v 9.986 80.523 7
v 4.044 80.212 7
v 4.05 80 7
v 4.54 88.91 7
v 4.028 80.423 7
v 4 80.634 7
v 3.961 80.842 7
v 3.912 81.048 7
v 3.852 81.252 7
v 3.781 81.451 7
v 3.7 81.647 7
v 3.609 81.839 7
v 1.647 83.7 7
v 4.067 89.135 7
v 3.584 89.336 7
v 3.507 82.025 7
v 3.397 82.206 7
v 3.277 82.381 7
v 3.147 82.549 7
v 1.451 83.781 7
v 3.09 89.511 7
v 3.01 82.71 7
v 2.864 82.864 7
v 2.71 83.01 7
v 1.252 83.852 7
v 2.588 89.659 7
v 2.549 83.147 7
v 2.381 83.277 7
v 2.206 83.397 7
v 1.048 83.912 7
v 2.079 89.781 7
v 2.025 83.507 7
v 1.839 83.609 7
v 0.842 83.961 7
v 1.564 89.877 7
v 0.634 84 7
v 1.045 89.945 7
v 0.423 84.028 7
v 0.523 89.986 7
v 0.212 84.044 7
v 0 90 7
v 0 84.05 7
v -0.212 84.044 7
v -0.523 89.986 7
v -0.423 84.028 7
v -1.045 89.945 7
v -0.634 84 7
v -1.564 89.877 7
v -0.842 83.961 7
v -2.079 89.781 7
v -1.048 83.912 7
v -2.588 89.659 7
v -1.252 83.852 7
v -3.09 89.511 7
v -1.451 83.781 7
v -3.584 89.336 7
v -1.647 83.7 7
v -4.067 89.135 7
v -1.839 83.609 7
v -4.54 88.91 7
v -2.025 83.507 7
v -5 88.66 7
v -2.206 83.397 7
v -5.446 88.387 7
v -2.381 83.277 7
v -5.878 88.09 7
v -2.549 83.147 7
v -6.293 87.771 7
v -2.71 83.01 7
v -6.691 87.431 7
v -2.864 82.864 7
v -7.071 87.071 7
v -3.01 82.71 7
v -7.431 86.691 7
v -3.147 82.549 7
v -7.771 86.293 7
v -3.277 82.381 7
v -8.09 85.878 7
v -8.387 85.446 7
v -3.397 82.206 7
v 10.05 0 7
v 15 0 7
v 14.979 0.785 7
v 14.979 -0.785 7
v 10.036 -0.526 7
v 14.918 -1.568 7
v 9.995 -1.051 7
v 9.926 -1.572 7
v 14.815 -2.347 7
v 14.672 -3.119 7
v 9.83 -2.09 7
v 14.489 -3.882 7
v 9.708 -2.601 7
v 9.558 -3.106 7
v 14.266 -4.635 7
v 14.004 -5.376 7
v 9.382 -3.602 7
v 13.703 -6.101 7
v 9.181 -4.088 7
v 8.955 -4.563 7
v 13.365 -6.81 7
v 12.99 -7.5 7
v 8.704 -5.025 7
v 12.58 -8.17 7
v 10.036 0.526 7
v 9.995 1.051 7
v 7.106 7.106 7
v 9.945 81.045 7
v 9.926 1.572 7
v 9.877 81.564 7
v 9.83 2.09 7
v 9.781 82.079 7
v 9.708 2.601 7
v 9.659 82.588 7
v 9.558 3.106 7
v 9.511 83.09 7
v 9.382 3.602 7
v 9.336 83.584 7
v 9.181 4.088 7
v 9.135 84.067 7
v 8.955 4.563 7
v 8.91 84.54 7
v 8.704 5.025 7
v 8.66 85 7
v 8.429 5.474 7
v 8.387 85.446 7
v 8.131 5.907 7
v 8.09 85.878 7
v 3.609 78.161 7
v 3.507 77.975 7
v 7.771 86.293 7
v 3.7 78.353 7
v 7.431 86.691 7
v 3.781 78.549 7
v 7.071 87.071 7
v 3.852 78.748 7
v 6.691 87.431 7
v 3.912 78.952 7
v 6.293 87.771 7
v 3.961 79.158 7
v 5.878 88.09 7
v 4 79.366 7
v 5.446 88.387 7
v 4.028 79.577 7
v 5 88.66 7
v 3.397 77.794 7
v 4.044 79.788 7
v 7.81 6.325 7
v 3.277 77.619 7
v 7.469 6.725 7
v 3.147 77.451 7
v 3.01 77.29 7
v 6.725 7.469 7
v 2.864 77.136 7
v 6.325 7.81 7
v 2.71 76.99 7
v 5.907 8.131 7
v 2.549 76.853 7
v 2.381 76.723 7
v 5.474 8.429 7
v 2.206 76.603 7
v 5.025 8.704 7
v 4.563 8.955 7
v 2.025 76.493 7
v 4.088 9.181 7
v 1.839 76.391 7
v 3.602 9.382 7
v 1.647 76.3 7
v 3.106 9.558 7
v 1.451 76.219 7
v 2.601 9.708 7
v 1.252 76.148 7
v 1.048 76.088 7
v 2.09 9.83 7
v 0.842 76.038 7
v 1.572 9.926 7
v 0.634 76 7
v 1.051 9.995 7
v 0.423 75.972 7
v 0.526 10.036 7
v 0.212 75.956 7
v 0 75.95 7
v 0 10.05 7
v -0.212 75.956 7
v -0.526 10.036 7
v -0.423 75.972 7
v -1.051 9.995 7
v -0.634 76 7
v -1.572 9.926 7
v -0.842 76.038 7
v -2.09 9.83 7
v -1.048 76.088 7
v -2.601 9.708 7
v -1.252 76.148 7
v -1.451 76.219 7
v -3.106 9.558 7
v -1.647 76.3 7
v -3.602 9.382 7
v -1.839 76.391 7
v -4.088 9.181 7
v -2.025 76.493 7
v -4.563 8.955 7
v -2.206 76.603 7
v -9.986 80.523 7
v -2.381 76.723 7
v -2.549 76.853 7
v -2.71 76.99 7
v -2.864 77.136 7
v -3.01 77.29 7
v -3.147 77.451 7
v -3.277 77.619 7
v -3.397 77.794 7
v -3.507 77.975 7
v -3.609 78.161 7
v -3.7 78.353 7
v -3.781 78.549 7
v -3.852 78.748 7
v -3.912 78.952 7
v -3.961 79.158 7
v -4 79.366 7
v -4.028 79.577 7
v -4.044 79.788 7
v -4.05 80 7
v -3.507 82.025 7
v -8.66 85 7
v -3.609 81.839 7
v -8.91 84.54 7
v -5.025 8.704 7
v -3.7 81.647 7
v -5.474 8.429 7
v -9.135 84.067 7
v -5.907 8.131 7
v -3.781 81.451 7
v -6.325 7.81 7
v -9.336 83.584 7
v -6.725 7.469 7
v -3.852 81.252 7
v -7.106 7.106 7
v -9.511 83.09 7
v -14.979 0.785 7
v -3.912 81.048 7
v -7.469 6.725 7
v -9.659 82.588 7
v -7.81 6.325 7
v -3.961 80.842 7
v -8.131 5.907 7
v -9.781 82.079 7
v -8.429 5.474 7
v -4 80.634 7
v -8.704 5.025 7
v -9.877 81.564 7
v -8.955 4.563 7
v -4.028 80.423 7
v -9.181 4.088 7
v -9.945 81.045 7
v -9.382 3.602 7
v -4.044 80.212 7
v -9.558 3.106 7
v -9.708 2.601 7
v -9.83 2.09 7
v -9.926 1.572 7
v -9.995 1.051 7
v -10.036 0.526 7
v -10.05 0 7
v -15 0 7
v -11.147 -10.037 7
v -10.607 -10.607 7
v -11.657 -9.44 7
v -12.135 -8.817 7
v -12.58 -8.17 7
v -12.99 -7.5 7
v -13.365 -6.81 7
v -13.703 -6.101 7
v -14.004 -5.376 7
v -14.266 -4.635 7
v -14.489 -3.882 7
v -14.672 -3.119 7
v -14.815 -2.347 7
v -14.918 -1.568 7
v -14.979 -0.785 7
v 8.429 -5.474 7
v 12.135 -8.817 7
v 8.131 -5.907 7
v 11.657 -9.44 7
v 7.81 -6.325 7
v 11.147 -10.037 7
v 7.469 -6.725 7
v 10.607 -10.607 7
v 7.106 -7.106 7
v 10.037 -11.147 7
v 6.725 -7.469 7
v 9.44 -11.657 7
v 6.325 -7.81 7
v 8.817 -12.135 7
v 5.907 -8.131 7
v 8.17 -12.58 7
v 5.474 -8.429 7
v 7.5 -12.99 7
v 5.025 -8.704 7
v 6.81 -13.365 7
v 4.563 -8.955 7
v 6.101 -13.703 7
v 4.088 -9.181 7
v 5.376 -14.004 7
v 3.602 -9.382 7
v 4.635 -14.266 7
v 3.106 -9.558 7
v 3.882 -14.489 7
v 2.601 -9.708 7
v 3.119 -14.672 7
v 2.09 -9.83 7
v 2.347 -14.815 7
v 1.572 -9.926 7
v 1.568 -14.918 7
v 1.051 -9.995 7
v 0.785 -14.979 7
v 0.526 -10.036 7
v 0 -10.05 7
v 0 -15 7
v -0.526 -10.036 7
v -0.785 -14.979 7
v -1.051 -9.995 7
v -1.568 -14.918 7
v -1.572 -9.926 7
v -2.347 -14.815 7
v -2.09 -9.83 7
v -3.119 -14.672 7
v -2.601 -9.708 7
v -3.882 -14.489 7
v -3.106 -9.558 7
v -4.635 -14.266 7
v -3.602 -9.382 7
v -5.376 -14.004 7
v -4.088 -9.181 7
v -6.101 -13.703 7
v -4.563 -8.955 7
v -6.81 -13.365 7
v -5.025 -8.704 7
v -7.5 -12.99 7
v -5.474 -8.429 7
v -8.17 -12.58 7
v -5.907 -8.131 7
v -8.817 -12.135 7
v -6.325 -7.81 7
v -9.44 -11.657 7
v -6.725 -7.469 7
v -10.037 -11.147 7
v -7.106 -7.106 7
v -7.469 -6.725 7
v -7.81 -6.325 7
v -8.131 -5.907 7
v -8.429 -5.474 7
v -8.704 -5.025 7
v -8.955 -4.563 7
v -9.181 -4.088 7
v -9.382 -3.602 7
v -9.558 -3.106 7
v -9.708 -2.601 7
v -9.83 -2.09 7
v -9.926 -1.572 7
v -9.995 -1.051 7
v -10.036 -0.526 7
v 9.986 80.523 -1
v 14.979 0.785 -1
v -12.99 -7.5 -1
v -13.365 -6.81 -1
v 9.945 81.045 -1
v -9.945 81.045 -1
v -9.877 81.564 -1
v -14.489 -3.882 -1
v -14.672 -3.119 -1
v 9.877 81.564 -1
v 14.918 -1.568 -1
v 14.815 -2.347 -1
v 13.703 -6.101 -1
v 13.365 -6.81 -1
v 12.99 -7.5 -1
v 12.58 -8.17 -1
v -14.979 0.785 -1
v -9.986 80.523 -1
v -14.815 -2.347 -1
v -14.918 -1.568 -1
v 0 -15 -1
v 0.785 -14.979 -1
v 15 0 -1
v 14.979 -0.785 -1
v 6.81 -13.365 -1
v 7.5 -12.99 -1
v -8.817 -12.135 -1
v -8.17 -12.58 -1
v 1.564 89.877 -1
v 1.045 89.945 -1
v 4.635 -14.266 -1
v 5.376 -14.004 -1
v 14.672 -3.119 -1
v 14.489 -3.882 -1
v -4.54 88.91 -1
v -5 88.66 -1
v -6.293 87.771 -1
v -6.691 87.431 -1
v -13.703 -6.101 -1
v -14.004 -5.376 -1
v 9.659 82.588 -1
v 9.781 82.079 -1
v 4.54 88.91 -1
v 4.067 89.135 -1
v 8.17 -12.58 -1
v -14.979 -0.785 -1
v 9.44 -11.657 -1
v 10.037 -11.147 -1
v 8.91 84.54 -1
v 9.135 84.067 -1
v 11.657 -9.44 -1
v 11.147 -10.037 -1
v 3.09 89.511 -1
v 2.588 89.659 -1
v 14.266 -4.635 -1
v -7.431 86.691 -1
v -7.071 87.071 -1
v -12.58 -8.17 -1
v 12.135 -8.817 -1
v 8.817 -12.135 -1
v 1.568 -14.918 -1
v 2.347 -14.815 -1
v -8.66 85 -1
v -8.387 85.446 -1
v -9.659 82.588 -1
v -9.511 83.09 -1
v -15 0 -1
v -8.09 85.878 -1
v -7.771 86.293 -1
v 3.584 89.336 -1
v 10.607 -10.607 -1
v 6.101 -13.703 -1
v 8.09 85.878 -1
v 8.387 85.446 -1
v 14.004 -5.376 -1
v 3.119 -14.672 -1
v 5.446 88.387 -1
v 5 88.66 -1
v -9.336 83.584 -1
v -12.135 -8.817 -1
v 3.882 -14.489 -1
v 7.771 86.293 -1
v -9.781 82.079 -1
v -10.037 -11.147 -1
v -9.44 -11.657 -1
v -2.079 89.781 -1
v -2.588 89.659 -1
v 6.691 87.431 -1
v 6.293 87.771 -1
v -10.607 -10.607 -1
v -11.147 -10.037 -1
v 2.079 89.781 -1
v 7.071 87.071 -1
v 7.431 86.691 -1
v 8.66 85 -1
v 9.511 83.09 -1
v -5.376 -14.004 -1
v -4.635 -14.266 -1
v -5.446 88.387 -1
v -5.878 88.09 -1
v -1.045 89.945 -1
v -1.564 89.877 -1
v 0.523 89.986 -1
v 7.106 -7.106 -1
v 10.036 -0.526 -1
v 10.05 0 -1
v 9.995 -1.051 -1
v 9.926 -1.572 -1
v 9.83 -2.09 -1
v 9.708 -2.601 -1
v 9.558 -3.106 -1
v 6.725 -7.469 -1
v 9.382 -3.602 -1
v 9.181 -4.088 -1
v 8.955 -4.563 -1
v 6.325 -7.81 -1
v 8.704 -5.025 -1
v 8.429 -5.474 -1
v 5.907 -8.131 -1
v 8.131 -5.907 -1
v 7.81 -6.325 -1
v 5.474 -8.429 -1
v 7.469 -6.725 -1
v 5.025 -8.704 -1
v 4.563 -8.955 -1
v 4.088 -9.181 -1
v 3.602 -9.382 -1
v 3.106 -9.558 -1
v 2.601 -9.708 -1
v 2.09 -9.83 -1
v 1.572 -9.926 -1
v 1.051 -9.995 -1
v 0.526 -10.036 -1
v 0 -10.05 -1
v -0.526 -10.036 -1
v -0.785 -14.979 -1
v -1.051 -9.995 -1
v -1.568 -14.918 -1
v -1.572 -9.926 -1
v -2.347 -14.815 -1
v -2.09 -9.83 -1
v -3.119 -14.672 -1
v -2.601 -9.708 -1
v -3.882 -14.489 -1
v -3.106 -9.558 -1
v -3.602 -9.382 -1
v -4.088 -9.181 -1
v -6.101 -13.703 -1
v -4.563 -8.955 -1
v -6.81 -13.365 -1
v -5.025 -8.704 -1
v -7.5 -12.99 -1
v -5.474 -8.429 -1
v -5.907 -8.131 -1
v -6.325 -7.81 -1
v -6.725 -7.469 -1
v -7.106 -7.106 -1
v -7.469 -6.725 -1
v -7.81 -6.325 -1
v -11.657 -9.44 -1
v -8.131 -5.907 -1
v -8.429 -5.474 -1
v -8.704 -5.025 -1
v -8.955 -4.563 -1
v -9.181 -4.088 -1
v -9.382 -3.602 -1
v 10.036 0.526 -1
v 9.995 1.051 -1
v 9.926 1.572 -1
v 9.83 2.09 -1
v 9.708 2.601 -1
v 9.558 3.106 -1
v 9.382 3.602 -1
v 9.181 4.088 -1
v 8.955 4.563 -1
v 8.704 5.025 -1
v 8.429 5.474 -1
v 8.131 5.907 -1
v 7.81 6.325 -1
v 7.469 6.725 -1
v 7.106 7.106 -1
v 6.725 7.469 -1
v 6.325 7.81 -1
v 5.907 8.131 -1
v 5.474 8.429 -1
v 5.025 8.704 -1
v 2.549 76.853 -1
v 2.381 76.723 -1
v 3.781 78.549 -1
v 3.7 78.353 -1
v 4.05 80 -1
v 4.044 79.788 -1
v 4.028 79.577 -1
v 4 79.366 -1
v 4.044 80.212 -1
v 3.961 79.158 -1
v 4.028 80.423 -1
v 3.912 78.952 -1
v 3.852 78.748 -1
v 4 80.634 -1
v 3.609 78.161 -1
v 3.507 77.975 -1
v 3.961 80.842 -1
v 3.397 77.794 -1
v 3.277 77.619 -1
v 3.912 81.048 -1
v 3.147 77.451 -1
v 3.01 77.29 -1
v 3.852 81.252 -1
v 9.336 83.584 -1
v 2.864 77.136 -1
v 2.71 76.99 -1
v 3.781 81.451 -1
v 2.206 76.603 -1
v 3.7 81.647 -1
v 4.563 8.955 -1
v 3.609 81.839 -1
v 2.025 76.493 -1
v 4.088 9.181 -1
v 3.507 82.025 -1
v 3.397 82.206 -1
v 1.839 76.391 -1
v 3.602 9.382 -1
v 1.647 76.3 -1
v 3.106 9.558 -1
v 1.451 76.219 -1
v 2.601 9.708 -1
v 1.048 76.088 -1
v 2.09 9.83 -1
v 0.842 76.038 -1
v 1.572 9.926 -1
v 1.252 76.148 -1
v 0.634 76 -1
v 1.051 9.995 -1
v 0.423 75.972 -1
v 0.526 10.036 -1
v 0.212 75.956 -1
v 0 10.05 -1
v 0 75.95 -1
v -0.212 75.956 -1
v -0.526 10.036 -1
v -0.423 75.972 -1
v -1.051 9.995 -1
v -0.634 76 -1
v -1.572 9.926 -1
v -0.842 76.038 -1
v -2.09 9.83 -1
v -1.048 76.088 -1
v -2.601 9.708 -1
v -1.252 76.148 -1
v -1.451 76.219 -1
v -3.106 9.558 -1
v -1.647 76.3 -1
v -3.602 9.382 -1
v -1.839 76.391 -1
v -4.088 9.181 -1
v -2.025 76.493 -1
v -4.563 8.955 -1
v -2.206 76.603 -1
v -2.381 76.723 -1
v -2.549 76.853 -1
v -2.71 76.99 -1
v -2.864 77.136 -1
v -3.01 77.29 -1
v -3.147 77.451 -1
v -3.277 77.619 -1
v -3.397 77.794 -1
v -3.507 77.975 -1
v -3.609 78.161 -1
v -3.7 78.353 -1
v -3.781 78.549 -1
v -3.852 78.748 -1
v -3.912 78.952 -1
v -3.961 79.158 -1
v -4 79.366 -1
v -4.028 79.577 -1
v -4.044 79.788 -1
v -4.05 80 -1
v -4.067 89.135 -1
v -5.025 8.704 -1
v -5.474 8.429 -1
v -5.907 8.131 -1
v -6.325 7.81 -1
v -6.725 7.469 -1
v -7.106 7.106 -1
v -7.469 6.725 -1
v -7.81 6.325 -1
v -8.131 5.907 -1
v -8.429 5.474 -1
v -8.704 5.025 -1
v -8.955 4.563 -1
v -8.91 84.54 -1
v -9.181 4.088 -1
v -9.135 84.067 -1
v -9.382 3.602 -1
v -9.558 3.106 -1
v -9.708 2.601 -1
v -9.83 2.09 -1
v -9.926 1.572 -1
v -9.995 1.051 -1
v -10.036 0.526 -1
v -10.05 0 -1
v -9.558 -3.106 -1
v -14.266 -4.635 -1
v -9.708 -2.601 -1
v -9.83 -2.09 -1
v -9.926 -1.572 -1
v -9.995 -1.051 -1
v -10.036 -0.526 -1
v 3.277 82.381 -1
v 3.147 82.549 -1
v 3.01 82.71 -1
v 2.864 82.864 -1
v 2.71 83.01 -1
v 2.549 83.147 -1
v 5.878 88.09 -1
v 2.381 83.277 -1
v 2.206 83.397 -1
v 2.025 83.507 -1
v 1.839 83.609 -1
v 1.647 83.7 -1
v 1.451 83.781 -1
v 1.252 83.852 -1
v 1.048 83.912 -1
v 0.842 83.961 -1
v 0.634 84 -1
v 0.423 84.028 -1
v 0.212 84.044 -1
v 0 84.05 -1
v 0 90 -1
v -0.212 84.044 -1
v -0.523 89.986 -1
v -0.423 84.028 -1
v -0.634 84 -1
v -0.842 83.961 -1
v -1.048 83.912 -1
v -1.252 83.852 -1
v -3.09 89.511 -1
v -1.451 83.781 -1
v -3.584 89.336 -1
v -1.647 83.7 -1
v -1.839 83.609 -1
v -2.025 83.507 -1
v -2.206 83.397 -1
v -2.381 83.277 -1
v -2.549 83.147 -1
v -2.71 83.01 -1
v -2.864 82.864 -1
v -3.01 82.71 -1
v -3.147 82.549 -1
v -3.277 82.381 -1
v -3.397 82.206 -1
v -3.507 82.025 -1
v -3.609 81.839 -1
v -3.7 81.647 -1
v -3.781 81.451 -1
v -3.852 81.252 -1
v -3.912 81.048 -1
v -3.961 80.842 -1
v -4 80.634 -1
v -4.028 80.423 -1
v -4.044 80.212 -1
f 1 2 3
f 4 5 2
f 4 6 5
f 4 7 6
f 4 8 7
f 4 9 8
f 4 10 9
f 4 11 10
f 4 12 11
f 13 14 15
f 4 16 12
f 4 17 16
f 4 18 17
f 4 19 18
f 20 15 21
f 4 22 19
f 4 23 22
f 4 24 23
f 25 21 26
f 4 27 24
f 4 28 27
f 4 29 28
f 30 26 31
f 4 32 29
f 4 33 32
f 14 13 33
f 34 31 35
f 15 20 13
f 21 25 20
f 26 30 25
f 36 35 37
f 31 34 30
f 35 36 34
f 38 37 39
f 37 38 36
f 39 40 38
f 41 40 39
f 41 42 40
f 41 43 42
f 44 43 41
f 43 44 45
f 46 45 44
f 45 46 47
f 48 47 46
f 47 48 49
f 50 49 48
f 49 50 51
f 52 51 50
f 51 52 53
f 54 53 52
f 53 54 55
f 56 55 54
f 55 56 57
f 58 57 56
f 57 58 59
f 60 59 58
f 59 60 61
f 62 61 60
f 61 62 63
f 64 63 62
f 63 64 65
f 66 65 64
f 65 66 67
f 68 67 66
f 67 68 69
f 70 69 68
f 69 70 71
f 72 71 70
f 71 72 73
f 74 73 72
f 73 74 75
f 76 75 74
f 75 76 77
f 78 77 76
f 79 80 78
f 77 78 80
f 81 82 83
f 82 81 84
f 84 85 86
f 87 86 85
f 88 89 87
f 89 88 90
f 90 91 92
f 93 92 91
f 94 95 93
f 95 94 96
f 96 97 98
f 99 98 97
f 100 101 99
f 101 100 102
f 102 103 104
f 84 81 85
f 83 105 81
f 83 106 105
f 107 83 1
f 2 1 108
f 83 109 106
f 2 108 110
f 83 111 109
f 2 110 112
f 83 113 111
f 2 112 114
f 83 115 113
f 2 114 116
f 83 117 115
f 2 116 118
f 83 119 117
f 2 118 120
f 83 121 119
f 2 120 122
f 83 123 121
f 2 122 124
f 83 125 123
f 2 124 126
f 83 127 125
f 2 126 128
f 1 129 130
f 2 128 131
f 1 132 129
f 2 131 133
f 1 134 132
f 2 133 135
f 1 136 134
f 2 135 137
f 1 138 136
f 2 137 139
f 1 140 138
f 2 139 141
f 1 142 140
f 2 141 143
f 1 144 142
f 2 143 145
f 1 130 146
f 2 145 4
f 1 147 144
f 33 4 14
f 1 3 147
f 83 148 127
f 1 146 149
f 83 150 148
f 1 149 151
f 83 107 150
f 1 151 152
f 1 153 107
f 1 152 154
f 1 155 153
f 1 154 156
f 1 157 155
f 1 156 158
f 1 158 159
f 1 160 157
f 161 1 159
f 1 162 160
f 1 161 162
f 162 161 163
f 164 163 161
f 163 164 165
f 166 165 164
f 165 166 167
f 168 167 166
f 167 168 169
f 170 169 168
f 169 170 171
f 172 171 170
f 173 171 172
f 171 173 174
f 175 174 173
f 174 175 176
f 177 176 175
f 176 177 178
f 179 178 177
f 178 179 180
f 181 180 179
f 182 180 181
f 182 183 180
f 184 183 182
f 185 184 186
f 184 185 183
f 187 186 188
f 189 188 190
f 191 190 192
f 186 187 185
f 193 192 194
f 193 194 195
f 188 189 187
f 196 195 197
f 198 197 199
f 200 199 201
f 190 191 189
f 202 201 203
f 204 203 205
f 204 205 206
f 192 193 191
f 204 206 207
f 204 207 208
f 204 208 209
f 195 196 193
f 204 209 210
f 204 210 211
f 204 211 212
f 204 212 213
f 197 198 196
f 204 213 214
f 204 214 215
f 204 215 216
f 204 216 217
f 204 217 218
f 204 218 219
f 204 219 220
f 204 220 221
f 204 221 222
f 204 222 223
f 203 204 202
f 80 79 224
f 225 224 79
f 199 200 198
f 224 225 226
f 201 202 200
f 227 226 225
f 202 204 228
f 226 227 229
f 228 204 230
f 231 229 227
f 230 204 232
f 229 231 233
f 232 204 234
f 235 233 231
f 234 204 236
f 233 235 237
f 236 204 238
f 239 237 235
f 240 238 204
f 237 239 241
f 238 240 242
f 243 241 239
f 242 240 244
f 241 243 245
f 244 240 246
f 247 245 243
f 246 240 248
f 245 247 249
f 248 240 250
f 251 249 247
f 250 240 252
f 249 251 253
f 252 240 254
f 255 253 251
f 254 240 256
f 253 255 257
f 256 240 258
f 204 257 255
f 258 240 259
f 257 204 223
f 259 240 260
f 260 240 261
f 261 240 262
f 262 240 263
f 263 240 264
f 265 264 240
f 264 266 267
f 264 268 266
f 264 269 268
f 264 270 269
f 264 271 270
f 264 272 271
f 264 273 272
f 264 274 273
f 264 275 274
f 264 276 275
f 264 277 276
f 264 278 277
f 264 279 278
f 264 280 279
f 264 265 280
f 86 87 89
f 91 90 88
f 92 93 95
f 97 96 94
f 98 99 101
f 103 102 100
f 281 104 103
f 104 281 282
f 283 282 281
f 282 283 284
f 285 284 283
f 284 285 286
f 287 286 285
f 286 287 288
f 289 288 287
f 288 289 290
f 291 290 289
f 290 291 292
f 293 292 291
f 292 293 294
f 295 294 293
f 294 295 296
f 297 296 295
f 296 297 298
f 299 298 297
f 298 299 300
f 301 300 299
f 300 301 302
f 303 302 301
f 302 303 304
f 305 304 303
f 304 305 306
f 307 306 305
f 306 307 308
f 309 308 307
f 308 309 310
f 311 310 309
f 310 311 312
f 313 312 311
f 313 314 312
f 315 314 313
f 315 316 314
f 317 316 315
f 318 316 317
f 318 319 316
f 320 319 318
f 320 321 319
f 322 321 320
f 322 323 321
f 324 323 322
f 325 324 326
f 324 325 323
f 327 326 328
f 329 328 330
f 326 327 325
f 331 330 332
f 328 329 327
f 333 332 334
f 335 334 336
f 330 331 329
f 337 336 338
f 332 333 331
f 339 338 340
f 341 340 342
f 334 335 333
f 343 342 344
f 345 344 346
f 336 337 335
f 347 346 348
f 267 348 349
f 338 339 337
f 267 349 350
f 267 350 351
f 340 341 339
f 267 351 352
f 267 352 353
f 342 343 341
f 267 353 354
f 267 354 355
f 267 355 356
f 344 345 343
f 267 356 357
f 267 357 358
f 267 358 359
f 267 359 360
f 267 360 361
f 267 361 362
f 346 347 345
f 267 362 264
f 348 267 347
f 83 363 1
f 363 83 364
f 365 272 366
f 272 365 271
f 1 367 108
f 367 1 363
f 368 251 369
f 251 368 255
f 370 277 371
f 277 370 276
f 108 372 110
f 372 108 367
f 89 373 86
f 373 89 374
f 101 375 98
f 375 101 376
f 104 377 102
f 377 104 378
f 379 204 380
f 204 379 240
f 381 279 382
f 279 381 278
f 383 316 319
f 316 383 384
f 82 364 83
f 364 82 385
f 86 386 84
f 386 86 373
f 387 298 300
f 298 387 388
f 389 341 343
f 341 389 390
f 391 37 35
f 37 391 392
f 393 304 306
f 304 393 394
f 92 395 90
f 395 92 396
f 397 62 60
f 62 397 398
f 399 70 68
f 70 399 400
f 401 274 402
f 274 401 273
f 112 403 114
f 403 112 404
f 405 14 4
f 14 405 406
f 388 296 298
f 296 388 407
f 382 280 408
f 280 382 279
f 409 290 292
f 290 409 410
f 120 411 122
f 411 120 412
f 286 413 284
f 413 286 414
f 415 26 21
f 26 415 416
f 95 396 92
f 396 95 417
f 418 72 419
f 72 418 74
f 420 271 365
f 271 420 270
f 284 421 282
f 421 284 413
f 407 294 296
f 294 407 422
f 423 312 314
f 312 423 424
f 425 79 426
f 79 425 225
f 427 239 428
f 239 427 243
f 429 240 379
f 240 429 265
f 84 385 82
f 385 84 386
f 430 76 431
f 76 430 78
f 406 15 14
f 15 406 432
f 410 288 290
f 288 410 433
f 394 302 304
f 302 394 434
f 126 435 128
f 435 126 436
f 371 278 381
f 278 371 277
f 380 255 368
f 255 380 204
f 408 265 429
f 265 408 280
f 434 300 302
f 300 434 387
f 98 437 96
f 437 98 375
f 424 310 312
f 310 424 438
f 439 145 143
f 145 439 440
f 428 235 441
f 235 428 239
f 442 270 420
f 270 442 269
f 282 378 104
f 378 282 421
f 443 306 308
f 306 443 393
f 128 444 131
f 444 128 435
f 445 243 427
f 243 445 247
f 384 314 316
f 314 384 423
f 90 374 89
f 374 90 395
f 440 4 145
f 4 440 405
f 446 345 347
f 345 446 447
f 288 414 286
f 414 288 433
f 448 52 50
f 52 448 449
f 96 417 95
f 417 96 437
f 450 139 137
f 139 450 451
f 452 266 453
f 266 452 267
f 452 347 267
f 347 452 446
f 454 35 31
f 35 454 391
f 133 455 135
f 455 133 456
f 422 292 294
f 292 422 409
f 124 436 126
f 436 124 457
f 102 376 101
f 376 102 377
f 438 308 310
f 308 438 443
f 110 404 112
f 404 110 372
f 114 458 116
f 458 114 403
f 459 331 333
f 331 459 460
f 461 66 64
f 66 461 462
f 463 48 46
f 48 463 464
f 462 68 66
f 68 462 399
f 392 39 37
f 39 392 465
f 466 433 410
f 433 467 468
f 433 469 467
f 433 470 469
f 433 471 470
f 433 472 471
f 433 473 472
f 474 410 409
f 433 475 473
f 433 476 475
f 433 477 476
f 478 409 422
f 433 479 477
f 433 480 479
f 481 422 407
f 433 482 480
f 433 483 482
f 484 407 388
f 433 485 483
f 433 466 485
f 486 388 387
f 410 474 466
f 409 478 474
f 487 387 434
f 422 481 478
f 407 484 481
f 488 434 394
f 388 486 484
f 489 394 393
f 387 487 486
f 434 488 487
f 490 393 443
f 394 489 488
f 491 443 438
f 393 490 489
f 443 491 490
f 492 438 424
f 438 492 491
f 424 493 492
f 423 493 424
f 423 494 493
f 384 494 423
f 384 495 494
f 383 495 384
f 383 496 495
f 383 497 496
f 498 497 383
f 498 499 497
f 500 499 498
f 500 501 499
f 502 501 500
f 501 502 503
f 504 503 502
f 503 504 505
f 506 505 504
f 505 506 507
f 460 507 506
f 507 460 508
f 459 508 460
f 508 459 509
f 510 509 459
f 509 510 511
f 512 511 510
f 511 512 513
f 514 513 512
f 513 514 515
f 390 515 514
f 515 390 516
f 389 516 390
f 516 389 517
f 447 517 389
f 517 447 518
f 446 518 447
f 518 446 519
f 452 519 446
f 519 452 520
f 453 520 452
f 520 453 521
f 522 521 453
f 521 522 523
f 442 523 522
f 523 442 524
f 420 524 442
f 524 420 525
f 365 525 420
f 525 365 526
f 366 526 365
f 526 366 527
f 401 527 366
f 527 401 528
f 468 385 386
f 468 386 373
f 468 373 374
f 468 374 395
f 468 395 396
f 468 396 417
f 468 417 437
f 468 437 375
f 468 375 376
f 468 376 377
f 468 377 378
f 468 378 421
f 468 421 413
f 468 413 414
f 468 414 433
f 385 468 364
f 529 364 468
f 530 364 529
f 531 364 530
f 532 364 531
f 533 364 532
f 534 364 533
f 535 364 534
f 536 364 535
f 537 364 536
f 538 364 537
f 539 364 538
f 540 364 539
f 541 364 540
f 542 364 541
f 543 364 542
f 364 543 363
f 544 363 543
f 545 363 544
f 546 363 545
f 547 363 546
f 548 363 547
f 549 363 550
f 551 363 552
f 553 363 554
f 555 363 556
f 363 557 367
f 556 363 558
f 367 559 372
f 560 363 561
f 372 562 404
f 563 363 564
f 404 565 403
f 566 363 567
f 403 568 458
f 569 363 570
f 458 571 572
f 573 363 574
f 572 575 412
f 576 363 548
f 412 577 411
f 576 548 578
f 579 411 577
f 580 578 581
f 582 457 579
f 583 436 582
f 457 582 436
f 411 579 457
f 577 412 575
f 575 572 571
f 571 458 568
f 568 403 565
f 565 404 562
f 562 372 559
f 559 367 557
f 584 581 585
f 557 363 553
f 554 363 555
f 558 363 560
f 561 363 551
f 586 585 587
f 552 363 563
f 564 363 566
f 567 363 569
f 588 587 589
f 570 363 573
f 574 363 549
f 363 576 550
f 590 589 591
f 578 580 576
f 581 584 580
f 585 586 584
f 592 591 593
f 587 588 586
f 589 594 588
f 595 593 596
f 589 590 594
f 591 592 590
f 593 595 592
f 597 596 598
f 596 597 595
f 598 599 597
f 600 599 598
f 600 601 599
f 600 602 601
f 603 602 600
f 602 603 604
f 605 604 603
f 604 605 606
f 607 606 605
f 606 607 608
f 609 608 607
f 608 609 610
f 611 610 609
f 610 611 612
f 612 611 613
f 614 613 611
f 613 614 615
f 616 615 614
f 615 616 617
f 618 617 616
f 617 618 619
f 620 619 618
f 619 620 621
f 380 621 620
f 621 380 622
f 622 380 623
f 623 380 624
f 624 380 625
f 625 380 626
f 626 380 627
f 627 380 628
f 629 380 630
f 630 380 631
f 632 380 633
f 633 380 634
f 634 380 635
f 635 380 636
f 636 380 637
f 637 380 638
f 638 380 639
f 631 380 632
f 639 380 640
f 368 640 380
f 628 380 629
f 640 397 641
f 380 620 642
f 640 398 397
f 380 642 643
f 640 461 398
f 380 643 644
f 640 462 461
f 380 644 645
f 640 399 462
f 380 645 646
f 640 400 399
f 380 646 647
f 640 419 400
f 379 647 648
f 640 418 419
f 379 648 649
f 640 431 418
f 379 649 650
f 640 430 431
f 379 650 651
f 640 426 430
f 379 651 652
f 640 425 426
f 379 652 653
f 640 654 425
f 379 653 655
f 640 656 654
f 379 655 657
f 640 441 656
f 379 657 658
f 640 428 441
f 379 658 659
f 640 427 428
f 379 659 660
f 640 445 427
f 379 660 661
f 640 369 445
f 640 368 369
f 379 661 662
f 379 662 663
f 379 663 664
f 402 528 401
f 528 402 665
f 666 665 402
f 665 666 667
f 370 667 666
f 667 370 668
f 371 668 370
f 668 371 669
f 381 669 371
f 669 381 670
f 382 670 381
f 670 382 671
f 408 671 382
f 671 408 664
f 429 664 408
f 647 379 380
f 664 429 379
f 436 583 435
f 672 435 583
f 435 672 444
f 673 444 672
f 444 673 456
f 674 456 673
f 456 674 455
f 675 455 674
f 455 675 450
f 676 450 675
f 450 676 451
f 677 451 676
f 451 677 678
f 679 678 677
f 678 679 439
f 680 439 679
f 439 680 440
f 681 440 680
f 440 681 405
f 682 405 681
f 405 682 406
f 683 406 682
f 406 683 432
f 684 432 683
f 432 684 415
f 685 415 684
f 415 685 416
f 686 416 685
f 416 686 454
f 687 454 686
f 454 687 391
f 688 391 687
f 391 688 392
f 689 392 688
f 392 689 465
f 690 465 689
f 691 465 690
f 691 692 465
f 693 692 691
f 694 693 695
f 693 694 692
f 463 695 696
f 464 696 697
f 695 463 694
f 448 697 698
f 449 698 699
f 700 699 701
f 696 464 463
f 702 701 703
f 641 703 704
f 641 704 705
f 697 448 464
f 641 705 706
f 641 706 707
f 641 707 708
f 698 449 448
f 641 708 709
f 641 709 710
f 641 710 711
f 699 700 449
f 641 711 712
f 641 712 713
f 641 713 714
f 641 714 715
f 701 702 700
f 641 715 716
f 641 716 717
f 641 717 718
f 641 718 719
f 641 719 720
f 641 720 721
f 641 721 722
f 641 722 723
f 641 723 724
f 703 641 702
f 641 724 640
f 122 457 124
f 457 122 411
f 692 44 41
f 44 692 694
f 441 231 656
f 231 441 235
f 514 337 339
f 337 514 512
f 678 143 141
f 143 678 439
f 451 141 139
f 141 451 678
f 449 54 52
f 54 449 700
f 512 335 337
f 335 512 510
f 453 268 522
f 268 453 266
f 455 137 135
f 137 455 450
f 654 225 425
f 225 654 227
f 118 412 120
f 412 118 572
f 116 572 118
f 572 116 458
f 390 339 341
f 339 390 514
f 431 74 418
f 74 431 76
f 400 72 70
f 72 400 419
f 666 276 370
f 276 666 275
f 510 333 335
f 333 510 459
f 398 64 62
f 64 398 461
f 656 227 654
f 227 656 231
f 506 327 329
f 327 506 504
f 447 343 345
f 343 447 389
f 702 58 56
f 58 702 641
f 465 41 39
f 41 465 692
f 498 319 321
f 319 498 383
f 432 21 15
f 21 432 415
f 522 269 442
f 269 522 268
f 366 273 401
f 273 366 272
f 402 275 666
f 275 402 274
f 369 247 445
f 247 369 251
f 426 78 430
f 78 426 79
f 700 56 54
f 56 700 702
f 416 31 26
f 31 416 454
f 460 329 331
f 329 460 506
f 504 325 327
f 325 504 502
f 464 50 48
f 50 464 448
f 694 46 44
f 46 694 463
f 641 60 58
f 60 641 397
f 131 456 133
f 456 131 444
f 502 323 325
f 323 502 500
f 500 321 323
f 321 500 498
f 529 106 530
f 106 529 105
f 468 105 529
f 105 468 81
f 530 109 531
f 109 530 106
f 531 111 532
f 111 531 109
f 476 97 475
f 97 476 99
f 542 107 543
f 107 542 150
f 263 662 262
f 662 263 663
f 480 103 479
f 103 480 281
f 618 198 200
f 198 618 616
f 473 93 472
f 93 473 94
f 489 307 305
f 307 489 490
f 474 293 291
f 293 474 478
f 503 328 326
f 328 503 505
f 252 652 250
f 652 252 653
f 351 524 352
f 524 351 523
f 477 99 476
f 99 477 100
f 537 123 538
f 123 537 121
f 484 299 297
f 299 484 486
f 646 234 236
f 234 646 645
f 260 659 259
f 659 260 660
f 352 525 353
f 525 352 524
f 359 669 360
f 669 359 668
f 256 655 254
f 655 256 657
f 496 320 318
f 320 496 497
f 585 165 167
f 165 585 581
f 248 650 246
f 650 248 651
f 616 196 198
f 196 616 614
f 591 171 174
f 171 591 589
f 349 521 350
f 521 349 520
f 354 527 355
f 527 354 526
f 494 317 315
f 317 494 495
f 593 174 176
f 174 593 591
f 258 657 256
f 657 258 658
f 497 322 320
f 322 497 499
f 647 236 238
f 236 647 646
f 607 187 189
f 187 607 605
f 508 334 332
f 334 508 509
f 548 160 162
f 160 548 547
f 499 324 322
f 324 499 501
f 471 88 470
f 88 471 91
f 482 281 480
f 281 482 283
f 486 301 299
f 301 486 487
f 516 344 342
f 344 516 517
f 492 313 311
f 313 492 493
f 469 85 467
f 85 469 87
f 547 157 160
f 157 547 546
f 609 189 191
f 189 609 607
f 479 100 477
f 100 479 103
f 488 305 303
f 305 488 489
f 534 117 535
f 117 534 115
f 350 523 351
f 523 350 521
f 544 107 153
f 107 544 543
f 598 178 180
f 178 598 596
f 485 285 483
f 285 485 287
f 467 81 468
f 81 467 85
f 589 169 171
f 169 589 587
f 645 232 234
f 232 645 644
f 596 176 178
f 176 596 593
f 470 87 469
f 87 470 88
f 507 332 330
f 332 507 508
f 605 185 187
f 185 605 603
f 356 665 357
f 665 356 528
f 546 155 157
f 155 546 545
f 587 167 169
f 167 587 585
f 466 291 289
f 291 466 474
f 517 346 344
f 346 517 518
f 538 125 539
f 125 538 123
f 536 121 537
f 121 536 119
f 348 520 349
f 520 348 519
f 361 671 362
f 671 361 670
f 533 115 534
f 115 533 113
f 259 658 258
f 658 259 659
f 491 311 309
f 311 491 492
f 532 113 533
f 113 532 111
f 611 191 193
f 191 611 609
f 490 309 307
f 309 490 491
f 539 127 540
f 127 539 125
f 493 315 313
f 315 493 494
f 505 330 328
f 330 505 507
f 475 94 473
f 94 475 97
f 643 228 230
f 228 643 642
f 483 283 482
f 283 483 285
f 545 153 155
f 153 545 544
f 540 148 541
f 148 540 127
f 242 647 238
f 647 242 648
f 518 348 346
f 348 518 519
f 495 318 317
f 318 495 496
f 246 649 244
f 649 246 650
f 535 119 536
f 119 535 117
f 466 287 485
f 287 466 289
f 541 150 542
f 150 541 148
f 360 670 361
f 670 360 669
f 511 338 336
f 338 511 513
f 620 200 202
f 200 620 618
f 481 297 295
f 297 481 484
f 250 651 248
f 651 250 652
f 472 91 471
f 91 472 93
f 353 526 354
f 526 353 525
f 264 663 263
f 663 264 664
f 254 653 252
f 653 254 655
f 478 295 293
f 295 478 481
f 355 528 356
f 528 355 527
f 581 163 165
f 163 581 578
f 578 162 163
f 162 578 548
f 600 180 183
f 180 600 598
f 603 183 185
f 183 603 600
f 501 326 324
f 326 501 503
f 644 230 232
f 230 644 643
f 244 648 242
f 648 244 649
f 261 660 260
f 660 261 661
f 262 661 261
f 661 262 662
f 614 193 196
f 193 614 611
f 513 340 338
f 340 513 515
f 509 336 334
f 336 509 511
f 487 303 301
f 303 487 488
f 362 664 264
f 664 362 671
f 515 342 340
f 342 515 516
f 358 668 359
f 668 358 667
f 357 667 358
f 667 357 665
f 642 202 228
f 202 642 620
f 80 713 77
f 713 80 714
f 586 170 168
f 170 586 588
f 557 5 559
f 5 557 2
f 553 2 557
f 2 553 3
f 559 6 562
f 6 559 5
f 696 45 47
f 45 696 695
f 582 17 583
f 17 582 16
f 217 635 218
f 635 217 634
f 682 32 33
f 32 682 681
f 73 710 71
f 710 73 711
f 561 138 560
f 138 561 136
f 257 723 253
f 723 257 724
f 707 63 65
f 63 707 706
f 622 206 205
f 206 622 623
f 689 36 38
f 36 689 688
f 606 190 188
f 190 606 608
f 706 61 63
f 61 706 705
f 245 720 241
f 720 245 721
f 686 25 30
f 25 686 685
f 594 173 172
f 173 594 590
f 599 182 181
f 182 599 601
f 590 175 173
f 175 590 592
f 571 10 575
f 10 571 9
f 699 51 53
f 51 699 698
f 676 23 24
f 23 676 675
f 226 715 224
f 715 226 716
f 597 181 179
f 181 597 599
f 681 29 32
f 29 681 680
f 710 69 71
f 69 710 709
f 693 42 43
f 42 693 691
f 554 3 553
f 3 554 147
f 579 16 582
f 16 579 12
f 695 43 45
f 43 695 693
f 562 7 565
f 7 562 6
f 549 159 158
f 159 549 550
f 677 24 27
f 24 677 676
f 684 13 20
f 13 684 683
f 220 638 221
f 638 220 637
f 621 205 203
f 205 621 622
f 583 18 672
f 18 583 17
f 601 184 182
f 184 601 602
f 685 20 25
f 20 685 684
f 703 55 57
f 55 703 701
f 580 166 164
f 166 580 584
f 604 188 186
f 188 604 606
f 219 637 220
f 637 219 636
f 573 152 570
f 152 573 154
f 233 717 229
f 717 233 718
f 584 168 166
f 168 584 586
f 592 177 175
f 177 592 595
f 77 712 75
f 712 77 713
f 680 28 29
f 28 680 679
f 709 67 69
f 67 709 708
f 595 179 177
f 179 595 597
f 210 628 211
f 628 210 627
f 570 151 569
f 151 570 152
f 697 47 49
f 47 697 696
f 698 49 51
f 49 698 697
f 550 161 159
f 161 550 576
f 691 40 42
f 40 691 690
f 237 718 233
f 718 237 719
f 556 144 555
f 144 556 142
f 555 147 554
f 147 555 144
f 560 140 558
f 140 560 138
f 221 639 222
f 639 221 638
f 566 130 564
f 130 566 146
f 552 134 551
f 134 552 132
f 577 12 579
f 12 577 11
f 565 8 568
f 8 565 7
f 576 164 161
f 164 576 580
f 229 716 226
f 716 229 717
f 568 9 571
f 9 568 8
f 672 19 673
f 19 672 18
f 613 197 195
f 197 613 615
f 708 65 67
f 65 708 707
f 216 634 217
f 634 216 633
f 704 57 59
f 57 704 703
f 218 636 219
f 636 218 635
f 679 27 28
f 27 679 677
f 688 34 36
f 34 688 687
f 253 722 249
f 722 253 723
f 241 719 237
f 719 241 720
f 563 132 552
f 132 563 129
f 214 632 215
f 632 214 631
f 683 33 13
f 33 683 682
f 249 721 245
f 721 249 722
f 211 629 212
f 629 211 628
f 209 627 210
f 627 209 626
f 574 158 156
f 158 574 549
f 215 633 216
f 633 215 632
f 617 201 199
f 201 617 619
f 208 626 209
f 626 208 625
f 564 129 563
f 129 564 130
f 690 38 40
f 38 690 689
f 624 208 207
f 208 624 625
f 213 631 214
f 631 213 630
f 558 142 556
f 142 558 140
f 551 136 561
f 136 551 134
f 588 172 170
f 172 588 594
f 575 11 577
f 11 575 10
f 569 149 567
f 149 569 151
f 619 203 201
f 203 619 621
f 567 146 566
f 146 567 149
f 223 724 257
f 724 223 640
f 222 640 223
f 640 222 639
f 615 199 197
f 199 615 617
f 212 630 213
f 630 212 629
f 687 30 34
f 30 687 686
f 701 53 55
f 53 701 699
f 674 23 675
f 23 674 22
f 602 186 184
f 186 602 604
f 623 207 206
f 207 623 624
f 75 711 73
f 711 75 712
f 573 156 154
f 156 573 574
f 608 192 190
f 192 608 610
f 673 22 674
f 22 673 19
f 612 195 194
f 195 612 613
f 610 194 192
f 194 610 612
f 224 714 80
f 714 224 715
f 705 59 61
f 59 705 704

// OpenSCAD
// file: spindleHandle.scad
include <./config.scad>

module spindleHandle() {

    module partsList() {
        // TODO: flanges for metal strings
    }


    module spindleHole() {

        translate([0, 0, -2]) {
            cylinder(d = spindleDiameter+0.1, h = spindleHandleThickness * 2);
            //translate([spindleDiameter * 0.75, 0, 0]) translate([-spindleDiameter/2, -spindleDiameter/2, -1]) cube([spindleDiameter, spindleDiameter, spindleHandleThickness]);
        }


    }

    difference() {
        translate([0, 0, -1])
        union() {
            hull() {
                cylinder(d = spindleDiameter * 1.5, h = spindleHandleThickness);
                translate([0, 80, 0]) cylinder(d = spindleDiameter, h = spindleHandleThickness);
            }
            //translate([0, 80, -80]) cylinder(d = 8, h = 80);
        }
        spindleHole();
        translate([0, 80, -10]) cylinder(d = 8.1, h = 80);
        translate([0, 0, -10]) cylinder(d= 4.2, h = 40);
    }

}


module drawSpindleHandleTopProjection() {
    // // Draufsicht
    translate([spindleDiameter*1.5/2, -spindleDiameter*1.5/2, 0])
    projection() {
        rotate([0,0,270])
        spindleHandle();
    }
}



module spindleHandleMeasuermentLinesLength() {
    color([0/255, 0/255, 0/255]) translate([0, 0, 0]) {

        square([lineThickness,lineGap * 2 + 20]);

        translate([15, 0, 0])
        square([lineThickness,lineGap + 20]);



        translate([15, -60, 0])
        square([lineThickness,lineGap + 20]);


        translate([95, 0, 0])
        square([lineThickness,lineGap + 20]);

        translate([95, -60, 0])
        square([lineThickness,lineGap + 20]);

        translate([105, 0, 0])
        square([lineThickness,lineGap * 2 + 20]);




        translate([-20, lineGap * 2, 0]) {
            length = 105 + 40;

            translate([40, 15, 0])
            text(size = textSize, str(105));

            square([length, lineThickness]);
        }


        translate([-20, lineGap, 0]) {
            length = 105 + 40;

            translate([60, 15, 0])
            text(size = textSize, str(80));

            translate([5, 15, 0])
            text(size = textSize, str(15));

            translate([115, 15, 0])
            text(size = textSize, str(spindleDiameter/2));


            translate([-140,-160, 0])
            text(size = textSize, str("Bohrung 20.1mm"));


            translate([100,-160, 0])
            text(size = textSize, str("Bohrung 8.1mm"));

            square([length, lineThickness]);
        }

    }
}


module spindleHandleMeasuermentLinesWidth() {
    color([0/255, 0/255, 0/255]) translate([0, 0, 0]) {

        translate([0, -230, 0])
        square([lineThickness,lineGap + 20]);


        translate([5, 0, 0])
        square([lineThickness,lineGap + 20]);

        translate([25, 0, 0])
        square([lineThickness,lineGap + 20]);


        translate([spindleDiameter*1.5, -230, 0])
        square([lineThickness,lineGap + 20]);


        translate([-20, -210, 0]) {
            length = 20 + 40;

            translate([20, 15, 0])
            text(size = textSize, str(spindleDiameter*1.5));

            square([length, lineThickness]);
        }


        translate([-20, lineGap, 0]) {
            length = 20 + 40;

            translate([15, 15, 0])
            text(size = textSize, str(spindleDiameter));

            square([length, lineThickness]);
        }

    }
}
// file: config.scad
drawReferences = false;
drawReferenceWall = false;

outerWidth = 1500;
outerDepth = 700;
outerHeight = 700;

profileSize = 40;

fireBasketHeight = 250;
fireBasketWidth = 400;
fireBasketGroundClearance = 100;
fireBasketFrontOpen = true;

spindleDiameter  = 20;
spindleOverlength = 5;
spindleWallExtension = 140;
spindleWheelDiameter = 200;
spindlePlateThickness = 5;
spindlePlateGap = 2;
spindleHandleThickness = 8;

grateGap = 4;
grateSize = 30;
grateProfileThickness = 3;

lineThickness = 1;
lineGap = 80;
textSize = 20;

$fn = 120;
// main file
include <./config.scad>
include <./spindleHandle.scad>


color([200/255, 200/255, 100/255])
spindleHandle();
